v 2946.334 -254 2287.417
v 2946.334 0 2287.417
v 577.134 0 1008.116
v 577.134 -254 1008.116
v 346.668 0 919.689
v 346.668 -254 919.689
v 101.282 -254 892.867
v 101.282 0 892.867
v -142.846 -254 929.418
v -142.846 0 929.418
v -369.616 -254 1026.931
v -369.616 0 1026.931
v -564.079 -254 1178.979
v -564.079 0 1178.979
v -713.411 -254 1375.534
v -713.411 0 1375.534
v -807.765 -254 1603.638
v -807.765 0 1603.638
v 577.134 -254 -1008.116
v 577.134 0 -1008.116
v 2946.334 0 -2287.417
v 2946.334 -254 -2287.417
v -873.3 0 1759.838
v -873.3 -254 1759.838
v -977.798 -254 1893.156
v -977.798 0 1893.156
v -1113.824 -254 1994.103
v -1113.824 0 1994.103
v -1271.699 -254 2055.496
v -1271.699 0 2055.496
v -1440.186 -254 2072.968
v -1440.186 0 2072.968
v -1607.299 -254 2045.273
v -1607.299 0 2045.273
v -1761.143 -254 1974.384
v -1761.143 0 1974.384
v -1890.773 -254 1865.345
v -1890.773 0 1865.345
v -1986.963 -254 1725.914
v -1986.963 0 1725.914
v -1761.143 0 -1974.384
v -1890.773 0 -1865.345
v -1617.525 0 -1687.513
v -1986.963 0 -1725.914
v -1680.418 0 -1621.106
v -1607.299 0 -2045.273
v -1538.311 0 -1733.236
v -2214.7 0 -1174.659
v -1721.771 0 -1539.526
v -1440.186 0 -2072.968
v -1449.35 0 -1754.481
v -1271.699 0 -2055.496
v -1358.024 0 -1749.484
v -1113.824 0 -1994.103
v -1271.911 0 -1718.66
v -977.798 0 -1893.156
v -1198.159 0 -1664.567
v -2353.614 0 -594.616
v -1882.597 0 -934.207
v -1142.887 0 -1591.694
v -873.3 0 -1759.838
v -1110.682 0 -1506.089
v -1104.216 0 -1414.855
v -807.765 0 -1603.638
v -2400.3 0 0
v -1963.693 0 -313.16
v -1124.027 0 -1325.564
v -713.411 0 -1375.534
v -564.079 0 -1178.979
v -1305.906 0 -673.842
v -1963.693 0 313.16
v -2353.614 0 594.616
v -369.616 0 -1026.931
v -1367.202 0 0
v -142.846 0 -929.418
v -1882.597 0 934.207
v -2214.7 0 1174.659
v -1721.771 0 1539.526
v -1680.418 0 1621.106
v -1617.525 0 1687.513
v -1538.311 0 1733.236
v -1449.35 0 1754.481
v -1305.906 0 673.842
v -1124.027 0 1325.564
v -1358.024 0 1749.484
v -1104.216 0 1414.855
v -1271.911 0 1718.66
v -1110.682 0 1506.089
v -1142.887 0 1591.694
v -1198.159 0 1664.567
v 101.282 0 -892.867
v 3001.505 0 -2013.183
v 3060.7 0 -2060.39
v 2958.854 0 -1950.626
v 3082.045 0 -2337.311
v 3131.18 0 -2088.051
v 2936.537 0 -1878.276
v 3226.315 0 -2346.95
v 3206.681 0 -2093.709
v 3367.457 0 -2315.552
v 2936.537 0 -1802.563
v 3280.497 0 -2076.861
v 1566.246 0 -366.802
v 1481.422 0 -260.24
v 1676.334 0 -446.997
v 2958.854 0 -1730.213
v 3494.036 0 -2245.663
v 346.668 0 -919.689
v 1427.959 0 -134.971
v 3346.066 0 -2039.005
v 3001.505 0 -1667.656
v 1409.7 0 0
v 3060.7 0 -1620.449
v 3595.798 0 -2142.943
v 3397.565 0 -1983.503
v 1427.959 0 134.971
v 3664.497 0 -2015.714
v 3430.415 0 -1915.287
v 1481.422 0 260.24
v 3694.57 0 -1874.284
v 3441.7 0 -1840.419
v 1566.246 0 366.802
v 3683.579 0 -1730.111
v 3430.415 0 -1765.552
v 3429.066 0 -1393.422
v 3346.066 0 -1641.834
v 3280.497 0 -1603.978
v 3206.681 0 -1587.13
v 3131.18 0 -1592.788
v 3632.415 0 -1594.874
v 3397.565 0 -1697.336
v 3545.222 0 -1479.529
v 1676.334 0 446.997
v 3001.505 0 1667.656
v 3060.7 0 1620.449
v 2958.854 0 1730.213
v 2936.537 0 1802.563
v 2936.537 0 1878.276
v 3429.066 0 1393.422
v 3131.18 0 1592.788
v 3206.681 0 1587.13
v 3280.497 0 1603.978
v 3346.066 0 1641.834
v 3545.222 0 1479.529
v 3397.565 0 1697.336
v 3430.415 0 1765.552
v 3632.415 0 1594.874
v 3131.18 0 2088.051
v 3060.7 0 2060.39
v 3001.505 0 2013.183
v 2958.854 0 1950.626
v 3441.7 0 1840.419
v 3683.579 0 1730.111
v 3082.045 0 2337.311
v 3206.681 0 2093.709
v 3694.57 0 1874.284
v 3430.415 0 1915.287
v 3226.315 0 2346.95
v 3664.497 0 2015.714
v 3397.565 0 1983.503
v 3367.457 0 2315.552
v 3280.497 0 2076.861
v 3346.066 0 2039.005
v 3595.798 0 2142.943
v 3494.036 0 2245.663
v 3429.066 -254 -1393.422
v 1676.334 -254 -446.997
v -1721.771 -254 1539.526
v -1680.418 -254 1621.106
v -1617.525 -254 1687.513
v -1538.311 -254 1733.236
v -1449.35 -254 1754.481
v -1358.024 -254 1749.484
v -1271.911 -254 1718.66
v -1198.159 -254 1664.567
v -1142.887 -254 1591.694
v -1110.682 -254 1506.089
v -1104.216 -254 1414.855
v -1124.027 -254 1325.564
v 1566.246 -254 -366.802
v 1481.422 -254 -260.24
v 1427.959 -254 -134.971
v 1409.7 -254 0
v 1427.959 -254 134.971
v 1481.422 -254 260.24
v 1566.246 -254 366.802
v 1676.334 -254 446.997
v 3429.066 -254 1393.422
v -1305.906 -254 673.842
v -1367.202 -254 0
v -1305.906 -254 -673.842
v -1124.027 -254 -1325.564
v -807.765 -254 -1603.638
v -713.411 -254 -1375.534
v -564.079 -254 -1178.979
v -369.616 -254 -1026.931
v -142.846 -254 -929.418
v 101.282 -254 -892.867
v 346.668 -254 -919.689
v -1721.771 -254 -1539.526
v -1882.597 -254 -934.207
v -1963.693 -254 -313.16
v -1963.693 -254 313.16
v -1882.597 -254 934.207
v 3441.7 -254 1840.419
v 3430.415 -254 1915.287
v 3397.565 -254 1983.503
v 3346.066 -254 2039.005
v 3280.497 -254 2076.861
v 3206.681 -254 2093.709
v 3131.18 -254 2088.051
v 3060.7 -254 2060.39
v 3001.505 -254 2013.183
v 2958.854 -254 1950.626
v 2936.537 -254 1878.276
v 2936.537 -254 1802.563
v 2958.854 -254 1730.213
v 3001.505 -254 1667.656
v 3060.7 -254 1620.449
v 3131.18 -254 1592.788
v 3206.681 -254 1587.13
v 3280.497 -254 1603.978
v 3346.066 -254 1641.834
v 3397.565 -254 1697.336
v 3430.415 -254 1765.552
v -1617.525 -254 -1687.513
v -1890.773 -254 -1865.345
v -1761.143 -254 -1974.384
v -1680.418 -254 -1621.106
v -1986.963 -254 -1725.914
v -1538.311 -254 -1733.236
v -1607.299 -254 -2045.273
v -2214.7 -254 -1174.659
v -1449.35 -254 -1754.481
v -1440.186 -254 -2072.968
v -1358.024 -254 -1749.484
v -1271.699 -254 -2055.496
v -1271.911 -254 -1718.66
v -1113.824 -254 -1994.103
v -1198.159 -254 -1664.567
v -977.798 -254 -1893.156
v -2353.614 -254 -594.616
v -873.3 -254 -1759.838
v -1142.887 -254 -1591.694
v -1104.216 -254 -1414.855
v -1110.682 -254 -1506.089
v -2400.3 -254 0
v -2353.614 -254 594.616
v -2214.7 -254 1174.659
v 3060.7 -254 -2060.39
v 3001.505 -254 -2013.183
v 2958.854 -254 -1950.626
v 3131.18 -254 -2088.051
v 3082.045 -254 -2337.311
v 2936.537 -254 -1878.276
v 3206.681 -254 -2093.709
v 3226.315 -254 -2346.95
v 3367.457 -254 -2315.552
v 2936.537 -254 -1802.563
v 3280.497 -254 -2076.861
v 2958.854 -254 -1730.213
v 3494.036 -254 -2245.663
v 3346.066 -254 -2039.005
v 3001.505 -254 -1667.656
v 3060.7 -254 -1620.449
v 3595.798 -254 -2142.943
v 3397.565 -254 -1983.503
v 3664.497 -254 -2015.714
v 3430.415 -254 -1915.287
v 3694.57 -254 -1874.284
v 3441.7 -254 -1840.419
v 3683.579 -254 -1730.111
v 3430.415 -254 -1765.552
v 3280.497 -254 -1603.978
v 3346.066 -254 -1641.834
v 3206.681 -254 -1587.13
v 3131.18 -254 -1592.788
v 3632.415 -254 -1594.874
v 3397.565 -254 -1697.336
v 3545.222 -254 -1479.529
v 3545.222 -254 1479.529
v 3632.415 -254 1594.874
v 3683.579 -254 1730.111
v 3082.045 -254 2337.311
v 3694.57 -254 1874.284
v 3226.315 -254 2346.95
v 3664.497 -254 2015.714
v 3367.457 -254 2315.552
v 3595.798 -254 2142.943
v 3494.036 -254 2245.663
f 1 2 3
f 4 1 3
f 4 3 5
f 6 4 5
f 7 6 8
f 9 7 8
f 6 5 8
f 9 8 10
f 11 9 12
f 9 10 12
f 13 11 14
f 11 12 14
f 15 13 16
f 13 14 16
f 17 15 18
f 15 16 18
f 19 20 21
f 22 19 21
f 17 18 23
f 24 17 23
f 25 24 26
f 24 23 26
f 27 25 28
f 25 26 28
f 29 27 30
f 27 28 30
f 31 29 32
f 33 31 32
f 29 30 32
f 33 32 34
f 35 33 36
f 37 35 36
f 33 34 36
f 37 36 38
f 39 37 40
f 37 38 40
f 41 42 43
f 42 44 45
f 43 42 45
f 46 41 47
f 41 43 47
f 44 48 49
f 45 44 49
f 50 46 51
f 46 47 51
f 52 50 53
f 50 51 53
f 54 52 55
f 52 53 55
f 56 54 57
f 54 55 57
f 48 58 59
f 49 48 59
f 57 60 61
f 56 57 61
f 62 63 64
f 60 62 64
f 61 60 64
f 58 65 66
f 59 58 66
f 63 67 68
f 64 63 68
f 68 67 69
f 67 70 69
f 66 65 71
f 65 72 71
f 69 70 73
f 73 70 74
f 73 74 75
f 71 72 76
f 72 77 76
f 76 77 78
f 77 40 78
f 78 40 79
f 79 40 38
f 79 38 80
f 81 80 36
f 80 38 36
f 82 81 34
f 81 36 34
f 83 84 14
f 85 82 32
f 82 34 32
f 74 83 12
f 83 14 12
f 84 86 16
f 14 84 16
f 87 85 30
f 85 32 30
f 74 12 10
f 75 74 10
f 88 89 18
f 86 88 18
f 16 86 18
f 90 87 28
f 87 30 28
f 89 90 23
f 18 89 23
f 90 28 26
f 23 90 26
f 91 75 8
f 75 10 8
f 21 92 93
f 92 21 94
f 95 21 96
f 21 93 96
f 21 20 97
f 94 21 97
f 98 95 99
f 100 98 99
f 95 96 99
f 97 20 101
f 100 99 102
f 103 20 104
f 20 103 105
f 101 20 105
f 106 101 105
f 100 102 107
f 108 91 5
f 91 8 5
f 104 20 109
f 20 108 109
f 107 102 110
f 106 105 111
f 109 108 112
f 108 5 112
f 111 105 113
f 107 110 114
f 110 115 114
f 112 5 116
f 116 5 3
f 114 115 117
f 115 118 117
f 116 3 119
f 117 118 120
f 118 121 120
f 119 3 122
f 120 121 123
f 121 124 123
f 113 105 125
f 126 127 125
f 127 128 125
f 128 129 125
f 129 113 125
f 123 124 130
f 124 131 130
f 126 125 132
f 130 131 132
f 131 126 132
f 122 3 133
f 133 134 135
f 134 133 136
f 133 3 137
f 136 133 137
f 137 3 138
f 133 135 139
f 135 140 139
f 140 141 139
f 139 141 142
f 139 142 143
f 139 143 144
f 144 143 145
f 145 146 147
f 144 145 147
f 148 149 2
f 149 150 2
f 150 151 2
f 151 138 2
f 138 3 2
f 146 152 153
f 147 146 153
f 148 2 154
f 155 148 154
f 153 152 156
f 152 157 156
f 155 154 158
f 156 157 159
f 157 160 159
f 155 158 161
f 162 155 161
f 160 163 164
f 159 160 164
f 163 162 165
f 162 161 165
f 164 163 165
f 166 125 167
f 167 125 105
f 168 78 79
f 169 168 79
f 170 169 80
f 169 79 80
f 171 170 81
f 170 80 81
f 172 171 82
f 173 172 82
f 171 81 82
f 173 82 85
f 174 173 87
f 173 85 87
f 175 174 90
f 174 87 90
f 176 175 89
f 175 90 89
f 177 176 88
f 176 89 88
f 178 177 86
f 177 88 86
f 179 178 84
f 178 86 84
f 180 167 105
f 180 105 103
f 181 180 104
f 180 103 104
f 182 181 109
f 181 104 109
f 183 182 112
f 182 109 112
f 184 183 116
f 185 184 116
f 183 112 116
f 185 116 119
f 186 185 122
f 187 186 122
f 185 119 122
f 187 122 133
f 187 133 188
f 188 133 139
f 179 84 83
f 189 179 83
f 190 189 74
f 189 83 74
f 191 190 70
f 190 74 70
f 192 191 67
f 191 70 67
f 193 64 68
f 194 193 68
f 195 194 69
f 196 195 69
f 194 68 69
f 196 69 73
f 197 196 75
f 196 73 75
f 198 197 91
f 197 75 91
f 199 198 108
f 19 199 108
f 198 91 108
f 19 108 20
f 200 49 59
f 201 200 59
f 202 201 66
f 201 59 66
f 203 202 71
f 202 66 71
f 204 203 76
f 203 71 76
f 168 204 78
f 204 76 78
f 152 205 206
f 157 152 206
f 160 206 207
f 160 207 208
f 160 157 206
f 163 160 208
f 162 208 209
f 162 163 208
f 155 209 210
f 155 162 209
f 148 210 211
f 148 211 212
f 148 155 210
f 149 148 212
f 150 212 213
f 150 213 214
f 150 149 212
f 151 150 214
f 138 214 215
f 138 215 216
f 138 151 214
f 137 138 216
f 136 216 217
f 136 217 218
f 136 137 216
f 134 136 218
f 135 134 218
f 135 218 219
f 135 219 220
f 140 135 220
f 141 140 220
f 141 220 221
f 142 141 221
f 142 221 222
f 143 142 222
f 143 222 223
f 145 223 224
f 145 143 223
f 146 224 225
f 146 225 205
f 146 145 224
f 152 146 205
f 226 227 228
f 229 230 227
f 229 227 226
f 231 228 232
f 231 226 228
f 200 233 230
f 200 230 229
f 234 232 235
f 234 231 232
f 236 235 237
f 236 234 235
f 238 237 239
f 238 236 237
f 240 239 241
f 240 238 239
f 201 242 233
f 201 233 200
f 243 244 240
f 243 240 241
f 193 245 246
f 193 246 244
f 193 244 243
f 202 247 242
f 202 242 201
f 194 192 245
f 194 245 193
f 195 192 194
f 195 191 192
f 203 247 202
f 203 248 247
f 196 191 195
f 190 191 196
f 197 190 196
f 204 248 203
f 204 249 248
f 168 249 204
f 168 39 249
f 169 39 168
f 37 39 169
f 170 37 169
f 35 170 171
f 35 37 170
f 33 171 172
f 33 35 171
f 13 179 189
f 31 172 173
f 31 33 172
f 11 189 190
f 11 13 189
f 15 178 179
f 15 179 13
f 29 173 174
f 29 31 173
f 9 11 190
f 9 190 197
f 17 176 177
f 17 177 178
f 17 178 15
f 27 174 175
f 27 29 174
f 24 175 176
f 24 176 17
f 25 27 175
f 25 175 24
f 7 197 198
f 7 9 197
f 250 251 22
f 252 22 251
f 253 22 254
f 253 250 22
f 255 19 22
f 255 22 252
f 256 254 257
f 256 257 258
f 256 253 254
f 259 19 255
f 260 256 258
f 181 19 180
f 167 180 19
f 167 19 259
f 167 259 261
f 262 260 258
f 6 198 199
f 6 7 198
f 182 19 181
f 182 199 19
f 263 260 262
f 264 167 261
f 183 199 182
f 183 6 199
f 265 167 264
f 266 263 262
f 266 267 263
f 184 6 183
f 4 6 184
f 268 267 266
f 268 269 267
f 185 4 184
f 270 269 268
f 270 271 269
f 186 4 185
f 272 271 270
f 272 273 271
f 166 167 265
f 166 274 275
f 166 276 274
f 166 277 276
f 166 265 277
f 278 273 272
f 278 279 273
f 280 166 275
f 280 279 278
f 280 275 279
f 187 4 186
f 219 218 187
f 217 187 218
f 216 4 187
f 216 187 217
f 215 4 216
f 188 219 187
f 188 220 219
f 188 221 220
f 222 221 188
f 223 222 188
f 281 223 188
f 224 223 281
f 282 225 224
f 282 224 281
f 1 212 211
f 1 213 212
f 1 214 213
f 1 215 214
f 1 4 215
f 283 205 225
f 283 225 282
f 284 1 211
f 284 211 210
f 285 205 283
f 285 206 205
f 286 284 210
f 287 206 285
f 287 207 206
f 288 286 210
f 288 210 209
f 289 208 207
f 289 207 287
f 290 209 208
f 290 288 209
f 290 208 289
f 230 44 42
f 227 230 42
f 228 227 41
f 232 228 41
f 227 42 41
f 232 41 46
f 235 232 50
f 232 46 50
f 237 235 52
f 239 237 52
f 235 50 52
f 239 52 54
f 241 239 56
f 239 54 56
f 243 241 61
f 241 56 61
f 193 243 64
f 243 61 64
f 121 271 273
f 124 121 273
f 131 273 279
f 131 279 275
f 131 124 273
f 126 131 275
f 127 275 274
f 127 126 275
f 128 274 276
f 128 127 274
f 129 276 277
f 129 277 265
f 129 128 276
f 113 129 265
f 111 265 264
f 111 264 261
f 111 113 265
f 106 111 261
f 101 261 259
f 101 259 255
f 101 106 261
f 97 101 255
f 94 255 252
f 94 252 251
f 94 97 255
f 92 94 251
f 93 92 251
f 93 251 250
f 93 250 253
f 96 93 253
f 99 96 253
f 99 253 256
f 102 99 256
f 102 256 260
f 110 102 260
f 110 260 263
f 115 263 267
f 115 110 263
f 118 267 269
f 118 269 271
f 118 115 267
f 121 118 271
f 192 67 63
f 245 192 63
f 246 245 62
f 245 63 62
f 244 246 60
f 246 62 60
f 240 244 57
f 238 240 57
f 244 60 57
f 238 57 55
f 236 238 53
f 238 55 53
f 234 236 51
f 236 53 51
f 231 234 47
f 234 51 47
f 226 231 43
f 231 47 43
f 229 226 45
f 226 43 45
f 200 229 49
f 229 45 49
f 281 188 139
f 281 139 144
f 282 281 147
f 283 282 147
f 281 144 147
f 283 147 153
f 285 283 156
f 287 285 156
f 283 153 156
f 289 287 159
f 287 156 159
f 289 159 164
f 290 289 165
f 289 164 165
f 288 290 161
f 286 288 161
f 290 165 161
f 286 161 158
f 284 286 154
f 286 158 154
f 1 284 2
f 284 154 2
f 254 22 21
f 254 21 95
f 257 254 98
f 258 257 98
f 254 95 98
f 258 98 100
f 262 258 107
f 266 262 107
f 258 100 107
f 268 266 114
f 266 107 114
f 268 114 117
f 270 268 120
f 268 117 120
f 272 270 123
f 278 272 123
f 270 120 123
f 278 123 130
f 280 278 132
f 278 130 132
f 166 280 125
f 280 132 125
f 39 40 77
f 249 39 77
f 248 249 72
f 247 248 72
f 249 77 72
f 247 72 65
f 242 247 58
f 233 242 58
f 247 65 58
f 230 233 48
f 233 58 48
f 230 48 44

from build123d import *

# Parameters (mm, degrees)
F0_R     = 254
F1_DEPTH = 254


with BuildPart() as f1:
    # F0 (on Front) → F1 (new body)
    with BuildSketch(Plane.XZ):
        with BuildLine():
            ThreePointArc((1676.33425, -446.997287), (1409.7, 0), (1676.33425, 446.997287))
            Line((1676.33425, 446.997287), (3429.06575, 1393.422166))
            ThreePointArc((3429.06575, 1393.422166), (3634.697287, 2081.785203), (2946.33425, 2287.41674))
            Line((2946.33425, 2287.41674), (577.134176, 1008.116463))
            ThreePointArc((577.134176, 1008.116463), (-259.373983, 970.865459), (-807.765235, 1603.637591))
            ThreePointArc((-807.765235, 1603.637591), (-1355.357315, 2069.875397), (-1986.962946, 1725.914491))
            ThreePointArc((-1986.962946, 1725.914491), (-2400.3, 0), (-1986.962946, -1725.914491))
            ThreePointArc((-1986.962946, -1725.914491), (-1355.357315, -2069.875397), (-807.765235, -1603.637591))
            ThreePointArc((-807.765235, -1603.637591), (-259.373983, -970.865459), (577.134176, -1008.116463))
            Line((577.134176, -1008.116463), (2946.33425, -2287.41674))
            ThreePointArc((2946.33425, -2287.41674), (3634.697287, -2081.785203), (3429.06575, -1393.422166))
            Line((3429.06575, -1393.422166), (1676.33425, -446.997287))
        make_face()
        with BuildLine():
            ThreePointArc((-1721.770907, 1539.525769), (-1313.851858, 1737.188693), (-1124.027034, 1325.56372))
            ThreePointArc((-1124.027034, 1325.56372), (-1367.202469, 0), (-1124.027034, -1325.56372))
            ThreePointArc((-1124.027034, -1325.56372), (-1313.851858, -1737.188693), (-1721.770907, -1539.525769))
            ThreePointArc((-1721.770907, -1539.525769), (-1973.862455, 0), (-1721.770907, 1539.525769))
        make_face(mode=Mode.SUBTRACT)
        with Locations((3187.7, -1840.419453)):
            Circle(F0_R, mode=Mode.SUBTRACT)
        with Locations((3187.7, 1840.419453)):
            Circle(F0_R, mode=Mode.SUBTRACT)
    extrude(amount=F1_DEPTH)


solid = f1.part
